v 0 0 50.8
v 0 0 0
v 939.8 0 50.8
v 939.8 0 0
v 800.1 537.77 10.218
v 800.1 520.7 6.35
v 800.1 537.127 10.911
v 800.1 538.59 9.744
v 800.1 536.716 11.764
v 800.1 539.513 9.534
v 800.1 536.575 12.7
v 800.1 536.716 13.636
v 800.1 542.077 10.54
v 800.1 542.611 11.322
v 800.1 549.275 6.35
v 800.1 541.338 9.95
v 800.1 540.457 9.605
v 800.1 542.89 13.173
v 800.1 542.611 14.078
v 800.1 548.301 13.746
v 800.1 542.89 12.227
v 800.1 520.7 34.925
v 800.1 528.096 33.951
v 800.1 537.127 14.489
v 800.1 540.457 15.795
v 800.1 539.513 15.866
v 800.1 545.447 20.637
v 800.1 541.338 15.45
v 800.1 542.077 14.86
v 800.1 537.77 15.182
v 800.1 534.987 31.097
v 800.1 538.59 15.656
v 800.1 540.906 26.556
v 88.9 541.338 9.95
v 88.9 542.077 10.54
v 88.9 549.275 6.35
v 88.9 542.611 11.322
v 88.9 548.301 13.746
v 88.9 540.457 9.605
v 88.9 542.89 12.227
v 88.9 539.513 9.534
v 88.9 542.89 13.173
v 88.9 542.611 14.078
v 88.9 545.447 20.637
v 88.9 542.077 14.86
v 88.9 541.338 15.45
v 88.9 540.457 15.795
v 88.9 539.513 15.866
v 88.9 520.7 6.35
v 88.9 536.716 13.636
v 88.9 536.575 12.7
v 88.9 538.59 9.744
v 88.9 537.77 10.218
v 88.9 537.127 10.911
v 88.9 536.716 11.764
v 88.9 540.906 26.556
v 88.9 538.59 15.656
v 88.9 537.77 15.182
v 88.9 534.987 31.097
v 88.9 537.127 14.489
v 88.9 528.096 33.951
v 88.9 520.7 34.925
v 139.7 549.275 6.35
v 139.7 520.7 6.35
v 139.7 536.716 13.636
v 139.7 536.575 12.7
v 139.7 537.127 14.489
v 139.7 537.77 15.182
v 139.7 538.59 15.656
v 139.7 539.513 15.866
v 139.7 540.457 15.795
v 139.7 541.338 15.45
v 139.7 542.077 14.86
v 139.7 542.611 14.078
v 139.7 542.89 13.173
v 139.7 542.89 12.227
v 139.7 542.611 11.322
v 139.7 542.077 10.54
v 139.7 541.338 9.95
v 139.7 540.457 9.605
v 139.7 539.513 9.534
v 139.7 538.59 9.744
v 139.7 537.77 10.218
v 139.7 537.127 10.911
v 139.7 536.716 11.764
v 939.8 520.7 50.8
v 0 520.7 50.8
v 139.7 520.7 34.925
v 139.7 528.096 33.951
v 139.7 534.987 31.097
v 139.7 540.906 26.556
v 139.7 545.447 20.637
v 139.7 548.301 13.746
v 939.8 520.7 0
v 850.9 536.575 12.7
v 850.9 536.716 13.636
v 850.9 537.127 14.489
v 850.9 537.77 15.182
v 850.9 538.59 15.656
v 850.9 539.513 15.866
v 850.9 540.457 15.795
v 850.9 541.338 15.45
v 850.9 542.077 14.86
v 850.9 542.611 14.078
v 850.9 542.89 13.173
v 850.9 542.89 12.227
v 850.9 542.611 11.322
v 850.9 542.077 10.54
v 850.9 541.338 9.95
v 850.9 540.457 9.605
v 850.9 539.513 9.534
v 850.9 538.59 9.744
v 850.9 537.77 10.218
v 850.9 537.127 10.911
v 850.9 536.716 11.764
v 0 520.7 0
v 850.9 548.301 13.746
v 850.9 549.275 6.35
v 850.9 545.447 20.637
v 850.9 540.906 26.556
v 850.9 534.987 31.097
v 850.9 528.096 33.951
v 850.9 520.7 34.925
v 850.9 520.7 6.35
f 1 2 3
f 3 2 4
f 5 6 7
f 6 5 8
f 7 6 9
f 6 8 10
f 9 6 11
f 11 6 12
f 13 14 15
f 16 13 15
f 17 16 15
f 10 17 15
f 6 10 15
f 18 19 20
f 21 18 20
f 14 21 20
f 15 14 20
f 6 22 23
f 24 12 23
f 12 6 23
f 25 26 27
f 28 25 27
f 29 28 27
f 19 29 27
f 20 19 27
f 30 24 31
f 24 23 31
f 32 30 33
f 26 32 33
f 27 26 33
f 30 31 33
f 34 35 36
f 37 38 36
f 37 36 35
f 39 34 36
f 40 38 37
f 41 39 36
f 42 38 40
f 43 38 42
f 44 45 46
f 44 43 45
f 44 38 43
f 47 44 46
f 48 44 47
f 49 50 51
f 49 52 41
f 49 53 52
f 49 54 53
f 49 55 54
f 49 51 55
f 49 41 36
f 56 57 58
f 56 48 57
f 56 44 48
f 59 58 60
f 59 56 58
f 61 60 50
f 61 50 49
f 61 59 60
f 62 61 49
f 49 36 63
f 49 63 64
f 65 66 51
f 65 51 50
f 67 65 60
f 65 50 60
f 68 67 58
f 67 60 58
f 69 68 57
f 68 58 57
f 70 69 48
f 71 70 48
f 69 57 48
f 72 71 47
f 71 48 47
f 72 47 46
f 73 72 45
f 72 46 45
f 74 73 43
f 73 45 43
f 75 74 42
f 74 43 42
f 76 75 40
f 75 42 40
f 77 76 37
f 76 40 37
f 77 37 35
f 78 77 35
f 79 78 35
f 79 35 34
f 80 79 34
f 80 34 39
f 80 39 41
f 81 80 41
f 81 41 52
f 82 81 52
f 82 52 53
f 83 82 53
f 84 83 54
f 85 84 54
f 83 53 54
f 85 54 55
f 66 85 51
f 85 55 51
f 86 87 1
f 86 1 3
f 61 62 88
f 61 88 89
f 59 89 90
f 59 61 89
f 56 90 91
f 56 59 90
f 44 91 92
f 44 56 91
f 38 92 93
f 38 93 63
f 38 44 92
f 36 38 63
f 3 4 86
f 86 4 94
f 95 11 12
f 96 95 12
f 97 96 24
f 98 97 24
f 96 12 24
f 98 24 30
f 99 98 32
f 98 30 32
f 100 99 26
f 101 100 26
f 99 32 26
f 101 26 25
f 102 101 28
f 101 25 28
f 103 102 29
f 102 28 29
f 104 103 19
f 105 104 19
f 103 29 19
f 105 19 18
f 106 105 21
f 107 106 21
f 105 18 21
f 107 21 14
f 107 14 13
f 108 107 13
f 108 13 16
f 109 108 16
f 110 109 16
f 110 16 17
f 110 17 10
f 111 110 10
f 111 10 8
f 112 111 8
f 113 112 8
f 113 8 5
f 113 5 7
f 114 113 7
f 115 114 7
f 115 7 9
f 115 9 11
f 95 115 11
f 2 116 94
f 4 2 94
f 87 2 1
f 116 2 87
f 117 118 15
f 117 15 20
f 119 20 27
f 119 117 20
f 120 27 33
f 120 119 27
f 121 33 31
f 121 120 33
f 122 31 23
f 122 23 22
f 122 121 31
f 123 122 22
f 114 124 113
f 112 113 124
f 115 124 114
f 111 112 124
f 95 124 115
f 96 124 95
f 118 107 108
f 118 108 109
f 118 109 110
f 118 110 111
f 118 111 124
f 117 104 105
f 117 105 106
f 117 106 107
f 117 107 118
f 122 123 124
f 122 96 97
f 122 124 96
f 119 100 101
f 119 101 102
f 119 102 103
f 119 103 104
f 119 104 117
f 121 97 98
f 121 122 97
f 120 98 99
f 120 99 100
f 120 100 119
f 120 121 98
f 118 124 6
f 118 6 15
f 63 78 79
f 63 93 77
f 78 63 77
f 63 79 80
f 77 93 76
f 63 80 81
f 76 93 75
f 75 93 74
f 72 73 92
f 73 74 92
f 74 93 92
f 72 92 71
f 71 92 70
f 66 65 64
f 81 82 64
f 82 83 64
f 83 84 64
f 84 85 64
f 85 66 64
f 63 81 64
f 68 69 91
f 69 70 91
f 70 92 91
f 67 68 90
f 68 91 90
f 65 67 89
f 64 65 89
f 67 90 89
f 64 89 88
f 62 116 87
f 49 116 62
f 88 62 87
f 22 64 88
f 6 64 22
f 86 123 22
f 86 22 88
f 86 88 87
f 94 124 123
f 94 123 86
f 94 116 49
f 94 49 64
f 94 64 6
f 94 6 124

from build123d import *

# Parameters (mm, degrees)
F0_W     = 939.8
F0_H     = 520.7
F1_DEPTH = 50.8
F4_DEPTH = 50.8
F5_D     = 6.35
F7_R     = 3.175
F8_DEPTH = 50.8


with BuildPart() as f1:
    # F0 (on Top) → F1 (new body)
    with BuildSketch(Plane.XY):
        with Locations((469.9, 260.35)):
            Rectangle(F0_W, F0_H)
    extrude(amount=F1_DEPTH)

    # F3 (on offset) → F4 (join)
    with BuildSketch(Plane.YZ.offset(850.9)):
        with BuildLine():
            ThreePointArc((549.275, 6.35), (540.9055762724, 26.5555762724), (520.7, 34.925))
            Line((520.7, 34.925), (520.7, 6.35))
            Line((520.7, 6.35), (549.275, 6.35))
        make_face()
    extrude(amount=-F4_DEPTH)

    # F5 (through all)
    with Locations(Plane.YZ.offset(850.9)):
        with Locations((539.75, 12.7)):
            Hole(F5_D / 2)

    # F7 (on offset) → F8 (join)
    with BuildSketch(Plane(origin=(88.9, 0, 0), x_dir=(0, -1, 0), z_dir=(-1, 0, 0))):
        with BuildLine():
            ThreePointArc((-520.7, 34.925), (-540.9055762724, 26.5555762724), (-549.275, 6.35))
            Line((-549.275, 6.35), (-520.7, 6.35))
            Line((-520.7, 6.35), (-520.7, 34.925))
        make_face()
        with Locations((-539.75, 12.7)):
            Circle(F7_R, mode=Mode.SUBTRACT)
    extrude(amount=-F8_DEPTH)


solid = f1.part
